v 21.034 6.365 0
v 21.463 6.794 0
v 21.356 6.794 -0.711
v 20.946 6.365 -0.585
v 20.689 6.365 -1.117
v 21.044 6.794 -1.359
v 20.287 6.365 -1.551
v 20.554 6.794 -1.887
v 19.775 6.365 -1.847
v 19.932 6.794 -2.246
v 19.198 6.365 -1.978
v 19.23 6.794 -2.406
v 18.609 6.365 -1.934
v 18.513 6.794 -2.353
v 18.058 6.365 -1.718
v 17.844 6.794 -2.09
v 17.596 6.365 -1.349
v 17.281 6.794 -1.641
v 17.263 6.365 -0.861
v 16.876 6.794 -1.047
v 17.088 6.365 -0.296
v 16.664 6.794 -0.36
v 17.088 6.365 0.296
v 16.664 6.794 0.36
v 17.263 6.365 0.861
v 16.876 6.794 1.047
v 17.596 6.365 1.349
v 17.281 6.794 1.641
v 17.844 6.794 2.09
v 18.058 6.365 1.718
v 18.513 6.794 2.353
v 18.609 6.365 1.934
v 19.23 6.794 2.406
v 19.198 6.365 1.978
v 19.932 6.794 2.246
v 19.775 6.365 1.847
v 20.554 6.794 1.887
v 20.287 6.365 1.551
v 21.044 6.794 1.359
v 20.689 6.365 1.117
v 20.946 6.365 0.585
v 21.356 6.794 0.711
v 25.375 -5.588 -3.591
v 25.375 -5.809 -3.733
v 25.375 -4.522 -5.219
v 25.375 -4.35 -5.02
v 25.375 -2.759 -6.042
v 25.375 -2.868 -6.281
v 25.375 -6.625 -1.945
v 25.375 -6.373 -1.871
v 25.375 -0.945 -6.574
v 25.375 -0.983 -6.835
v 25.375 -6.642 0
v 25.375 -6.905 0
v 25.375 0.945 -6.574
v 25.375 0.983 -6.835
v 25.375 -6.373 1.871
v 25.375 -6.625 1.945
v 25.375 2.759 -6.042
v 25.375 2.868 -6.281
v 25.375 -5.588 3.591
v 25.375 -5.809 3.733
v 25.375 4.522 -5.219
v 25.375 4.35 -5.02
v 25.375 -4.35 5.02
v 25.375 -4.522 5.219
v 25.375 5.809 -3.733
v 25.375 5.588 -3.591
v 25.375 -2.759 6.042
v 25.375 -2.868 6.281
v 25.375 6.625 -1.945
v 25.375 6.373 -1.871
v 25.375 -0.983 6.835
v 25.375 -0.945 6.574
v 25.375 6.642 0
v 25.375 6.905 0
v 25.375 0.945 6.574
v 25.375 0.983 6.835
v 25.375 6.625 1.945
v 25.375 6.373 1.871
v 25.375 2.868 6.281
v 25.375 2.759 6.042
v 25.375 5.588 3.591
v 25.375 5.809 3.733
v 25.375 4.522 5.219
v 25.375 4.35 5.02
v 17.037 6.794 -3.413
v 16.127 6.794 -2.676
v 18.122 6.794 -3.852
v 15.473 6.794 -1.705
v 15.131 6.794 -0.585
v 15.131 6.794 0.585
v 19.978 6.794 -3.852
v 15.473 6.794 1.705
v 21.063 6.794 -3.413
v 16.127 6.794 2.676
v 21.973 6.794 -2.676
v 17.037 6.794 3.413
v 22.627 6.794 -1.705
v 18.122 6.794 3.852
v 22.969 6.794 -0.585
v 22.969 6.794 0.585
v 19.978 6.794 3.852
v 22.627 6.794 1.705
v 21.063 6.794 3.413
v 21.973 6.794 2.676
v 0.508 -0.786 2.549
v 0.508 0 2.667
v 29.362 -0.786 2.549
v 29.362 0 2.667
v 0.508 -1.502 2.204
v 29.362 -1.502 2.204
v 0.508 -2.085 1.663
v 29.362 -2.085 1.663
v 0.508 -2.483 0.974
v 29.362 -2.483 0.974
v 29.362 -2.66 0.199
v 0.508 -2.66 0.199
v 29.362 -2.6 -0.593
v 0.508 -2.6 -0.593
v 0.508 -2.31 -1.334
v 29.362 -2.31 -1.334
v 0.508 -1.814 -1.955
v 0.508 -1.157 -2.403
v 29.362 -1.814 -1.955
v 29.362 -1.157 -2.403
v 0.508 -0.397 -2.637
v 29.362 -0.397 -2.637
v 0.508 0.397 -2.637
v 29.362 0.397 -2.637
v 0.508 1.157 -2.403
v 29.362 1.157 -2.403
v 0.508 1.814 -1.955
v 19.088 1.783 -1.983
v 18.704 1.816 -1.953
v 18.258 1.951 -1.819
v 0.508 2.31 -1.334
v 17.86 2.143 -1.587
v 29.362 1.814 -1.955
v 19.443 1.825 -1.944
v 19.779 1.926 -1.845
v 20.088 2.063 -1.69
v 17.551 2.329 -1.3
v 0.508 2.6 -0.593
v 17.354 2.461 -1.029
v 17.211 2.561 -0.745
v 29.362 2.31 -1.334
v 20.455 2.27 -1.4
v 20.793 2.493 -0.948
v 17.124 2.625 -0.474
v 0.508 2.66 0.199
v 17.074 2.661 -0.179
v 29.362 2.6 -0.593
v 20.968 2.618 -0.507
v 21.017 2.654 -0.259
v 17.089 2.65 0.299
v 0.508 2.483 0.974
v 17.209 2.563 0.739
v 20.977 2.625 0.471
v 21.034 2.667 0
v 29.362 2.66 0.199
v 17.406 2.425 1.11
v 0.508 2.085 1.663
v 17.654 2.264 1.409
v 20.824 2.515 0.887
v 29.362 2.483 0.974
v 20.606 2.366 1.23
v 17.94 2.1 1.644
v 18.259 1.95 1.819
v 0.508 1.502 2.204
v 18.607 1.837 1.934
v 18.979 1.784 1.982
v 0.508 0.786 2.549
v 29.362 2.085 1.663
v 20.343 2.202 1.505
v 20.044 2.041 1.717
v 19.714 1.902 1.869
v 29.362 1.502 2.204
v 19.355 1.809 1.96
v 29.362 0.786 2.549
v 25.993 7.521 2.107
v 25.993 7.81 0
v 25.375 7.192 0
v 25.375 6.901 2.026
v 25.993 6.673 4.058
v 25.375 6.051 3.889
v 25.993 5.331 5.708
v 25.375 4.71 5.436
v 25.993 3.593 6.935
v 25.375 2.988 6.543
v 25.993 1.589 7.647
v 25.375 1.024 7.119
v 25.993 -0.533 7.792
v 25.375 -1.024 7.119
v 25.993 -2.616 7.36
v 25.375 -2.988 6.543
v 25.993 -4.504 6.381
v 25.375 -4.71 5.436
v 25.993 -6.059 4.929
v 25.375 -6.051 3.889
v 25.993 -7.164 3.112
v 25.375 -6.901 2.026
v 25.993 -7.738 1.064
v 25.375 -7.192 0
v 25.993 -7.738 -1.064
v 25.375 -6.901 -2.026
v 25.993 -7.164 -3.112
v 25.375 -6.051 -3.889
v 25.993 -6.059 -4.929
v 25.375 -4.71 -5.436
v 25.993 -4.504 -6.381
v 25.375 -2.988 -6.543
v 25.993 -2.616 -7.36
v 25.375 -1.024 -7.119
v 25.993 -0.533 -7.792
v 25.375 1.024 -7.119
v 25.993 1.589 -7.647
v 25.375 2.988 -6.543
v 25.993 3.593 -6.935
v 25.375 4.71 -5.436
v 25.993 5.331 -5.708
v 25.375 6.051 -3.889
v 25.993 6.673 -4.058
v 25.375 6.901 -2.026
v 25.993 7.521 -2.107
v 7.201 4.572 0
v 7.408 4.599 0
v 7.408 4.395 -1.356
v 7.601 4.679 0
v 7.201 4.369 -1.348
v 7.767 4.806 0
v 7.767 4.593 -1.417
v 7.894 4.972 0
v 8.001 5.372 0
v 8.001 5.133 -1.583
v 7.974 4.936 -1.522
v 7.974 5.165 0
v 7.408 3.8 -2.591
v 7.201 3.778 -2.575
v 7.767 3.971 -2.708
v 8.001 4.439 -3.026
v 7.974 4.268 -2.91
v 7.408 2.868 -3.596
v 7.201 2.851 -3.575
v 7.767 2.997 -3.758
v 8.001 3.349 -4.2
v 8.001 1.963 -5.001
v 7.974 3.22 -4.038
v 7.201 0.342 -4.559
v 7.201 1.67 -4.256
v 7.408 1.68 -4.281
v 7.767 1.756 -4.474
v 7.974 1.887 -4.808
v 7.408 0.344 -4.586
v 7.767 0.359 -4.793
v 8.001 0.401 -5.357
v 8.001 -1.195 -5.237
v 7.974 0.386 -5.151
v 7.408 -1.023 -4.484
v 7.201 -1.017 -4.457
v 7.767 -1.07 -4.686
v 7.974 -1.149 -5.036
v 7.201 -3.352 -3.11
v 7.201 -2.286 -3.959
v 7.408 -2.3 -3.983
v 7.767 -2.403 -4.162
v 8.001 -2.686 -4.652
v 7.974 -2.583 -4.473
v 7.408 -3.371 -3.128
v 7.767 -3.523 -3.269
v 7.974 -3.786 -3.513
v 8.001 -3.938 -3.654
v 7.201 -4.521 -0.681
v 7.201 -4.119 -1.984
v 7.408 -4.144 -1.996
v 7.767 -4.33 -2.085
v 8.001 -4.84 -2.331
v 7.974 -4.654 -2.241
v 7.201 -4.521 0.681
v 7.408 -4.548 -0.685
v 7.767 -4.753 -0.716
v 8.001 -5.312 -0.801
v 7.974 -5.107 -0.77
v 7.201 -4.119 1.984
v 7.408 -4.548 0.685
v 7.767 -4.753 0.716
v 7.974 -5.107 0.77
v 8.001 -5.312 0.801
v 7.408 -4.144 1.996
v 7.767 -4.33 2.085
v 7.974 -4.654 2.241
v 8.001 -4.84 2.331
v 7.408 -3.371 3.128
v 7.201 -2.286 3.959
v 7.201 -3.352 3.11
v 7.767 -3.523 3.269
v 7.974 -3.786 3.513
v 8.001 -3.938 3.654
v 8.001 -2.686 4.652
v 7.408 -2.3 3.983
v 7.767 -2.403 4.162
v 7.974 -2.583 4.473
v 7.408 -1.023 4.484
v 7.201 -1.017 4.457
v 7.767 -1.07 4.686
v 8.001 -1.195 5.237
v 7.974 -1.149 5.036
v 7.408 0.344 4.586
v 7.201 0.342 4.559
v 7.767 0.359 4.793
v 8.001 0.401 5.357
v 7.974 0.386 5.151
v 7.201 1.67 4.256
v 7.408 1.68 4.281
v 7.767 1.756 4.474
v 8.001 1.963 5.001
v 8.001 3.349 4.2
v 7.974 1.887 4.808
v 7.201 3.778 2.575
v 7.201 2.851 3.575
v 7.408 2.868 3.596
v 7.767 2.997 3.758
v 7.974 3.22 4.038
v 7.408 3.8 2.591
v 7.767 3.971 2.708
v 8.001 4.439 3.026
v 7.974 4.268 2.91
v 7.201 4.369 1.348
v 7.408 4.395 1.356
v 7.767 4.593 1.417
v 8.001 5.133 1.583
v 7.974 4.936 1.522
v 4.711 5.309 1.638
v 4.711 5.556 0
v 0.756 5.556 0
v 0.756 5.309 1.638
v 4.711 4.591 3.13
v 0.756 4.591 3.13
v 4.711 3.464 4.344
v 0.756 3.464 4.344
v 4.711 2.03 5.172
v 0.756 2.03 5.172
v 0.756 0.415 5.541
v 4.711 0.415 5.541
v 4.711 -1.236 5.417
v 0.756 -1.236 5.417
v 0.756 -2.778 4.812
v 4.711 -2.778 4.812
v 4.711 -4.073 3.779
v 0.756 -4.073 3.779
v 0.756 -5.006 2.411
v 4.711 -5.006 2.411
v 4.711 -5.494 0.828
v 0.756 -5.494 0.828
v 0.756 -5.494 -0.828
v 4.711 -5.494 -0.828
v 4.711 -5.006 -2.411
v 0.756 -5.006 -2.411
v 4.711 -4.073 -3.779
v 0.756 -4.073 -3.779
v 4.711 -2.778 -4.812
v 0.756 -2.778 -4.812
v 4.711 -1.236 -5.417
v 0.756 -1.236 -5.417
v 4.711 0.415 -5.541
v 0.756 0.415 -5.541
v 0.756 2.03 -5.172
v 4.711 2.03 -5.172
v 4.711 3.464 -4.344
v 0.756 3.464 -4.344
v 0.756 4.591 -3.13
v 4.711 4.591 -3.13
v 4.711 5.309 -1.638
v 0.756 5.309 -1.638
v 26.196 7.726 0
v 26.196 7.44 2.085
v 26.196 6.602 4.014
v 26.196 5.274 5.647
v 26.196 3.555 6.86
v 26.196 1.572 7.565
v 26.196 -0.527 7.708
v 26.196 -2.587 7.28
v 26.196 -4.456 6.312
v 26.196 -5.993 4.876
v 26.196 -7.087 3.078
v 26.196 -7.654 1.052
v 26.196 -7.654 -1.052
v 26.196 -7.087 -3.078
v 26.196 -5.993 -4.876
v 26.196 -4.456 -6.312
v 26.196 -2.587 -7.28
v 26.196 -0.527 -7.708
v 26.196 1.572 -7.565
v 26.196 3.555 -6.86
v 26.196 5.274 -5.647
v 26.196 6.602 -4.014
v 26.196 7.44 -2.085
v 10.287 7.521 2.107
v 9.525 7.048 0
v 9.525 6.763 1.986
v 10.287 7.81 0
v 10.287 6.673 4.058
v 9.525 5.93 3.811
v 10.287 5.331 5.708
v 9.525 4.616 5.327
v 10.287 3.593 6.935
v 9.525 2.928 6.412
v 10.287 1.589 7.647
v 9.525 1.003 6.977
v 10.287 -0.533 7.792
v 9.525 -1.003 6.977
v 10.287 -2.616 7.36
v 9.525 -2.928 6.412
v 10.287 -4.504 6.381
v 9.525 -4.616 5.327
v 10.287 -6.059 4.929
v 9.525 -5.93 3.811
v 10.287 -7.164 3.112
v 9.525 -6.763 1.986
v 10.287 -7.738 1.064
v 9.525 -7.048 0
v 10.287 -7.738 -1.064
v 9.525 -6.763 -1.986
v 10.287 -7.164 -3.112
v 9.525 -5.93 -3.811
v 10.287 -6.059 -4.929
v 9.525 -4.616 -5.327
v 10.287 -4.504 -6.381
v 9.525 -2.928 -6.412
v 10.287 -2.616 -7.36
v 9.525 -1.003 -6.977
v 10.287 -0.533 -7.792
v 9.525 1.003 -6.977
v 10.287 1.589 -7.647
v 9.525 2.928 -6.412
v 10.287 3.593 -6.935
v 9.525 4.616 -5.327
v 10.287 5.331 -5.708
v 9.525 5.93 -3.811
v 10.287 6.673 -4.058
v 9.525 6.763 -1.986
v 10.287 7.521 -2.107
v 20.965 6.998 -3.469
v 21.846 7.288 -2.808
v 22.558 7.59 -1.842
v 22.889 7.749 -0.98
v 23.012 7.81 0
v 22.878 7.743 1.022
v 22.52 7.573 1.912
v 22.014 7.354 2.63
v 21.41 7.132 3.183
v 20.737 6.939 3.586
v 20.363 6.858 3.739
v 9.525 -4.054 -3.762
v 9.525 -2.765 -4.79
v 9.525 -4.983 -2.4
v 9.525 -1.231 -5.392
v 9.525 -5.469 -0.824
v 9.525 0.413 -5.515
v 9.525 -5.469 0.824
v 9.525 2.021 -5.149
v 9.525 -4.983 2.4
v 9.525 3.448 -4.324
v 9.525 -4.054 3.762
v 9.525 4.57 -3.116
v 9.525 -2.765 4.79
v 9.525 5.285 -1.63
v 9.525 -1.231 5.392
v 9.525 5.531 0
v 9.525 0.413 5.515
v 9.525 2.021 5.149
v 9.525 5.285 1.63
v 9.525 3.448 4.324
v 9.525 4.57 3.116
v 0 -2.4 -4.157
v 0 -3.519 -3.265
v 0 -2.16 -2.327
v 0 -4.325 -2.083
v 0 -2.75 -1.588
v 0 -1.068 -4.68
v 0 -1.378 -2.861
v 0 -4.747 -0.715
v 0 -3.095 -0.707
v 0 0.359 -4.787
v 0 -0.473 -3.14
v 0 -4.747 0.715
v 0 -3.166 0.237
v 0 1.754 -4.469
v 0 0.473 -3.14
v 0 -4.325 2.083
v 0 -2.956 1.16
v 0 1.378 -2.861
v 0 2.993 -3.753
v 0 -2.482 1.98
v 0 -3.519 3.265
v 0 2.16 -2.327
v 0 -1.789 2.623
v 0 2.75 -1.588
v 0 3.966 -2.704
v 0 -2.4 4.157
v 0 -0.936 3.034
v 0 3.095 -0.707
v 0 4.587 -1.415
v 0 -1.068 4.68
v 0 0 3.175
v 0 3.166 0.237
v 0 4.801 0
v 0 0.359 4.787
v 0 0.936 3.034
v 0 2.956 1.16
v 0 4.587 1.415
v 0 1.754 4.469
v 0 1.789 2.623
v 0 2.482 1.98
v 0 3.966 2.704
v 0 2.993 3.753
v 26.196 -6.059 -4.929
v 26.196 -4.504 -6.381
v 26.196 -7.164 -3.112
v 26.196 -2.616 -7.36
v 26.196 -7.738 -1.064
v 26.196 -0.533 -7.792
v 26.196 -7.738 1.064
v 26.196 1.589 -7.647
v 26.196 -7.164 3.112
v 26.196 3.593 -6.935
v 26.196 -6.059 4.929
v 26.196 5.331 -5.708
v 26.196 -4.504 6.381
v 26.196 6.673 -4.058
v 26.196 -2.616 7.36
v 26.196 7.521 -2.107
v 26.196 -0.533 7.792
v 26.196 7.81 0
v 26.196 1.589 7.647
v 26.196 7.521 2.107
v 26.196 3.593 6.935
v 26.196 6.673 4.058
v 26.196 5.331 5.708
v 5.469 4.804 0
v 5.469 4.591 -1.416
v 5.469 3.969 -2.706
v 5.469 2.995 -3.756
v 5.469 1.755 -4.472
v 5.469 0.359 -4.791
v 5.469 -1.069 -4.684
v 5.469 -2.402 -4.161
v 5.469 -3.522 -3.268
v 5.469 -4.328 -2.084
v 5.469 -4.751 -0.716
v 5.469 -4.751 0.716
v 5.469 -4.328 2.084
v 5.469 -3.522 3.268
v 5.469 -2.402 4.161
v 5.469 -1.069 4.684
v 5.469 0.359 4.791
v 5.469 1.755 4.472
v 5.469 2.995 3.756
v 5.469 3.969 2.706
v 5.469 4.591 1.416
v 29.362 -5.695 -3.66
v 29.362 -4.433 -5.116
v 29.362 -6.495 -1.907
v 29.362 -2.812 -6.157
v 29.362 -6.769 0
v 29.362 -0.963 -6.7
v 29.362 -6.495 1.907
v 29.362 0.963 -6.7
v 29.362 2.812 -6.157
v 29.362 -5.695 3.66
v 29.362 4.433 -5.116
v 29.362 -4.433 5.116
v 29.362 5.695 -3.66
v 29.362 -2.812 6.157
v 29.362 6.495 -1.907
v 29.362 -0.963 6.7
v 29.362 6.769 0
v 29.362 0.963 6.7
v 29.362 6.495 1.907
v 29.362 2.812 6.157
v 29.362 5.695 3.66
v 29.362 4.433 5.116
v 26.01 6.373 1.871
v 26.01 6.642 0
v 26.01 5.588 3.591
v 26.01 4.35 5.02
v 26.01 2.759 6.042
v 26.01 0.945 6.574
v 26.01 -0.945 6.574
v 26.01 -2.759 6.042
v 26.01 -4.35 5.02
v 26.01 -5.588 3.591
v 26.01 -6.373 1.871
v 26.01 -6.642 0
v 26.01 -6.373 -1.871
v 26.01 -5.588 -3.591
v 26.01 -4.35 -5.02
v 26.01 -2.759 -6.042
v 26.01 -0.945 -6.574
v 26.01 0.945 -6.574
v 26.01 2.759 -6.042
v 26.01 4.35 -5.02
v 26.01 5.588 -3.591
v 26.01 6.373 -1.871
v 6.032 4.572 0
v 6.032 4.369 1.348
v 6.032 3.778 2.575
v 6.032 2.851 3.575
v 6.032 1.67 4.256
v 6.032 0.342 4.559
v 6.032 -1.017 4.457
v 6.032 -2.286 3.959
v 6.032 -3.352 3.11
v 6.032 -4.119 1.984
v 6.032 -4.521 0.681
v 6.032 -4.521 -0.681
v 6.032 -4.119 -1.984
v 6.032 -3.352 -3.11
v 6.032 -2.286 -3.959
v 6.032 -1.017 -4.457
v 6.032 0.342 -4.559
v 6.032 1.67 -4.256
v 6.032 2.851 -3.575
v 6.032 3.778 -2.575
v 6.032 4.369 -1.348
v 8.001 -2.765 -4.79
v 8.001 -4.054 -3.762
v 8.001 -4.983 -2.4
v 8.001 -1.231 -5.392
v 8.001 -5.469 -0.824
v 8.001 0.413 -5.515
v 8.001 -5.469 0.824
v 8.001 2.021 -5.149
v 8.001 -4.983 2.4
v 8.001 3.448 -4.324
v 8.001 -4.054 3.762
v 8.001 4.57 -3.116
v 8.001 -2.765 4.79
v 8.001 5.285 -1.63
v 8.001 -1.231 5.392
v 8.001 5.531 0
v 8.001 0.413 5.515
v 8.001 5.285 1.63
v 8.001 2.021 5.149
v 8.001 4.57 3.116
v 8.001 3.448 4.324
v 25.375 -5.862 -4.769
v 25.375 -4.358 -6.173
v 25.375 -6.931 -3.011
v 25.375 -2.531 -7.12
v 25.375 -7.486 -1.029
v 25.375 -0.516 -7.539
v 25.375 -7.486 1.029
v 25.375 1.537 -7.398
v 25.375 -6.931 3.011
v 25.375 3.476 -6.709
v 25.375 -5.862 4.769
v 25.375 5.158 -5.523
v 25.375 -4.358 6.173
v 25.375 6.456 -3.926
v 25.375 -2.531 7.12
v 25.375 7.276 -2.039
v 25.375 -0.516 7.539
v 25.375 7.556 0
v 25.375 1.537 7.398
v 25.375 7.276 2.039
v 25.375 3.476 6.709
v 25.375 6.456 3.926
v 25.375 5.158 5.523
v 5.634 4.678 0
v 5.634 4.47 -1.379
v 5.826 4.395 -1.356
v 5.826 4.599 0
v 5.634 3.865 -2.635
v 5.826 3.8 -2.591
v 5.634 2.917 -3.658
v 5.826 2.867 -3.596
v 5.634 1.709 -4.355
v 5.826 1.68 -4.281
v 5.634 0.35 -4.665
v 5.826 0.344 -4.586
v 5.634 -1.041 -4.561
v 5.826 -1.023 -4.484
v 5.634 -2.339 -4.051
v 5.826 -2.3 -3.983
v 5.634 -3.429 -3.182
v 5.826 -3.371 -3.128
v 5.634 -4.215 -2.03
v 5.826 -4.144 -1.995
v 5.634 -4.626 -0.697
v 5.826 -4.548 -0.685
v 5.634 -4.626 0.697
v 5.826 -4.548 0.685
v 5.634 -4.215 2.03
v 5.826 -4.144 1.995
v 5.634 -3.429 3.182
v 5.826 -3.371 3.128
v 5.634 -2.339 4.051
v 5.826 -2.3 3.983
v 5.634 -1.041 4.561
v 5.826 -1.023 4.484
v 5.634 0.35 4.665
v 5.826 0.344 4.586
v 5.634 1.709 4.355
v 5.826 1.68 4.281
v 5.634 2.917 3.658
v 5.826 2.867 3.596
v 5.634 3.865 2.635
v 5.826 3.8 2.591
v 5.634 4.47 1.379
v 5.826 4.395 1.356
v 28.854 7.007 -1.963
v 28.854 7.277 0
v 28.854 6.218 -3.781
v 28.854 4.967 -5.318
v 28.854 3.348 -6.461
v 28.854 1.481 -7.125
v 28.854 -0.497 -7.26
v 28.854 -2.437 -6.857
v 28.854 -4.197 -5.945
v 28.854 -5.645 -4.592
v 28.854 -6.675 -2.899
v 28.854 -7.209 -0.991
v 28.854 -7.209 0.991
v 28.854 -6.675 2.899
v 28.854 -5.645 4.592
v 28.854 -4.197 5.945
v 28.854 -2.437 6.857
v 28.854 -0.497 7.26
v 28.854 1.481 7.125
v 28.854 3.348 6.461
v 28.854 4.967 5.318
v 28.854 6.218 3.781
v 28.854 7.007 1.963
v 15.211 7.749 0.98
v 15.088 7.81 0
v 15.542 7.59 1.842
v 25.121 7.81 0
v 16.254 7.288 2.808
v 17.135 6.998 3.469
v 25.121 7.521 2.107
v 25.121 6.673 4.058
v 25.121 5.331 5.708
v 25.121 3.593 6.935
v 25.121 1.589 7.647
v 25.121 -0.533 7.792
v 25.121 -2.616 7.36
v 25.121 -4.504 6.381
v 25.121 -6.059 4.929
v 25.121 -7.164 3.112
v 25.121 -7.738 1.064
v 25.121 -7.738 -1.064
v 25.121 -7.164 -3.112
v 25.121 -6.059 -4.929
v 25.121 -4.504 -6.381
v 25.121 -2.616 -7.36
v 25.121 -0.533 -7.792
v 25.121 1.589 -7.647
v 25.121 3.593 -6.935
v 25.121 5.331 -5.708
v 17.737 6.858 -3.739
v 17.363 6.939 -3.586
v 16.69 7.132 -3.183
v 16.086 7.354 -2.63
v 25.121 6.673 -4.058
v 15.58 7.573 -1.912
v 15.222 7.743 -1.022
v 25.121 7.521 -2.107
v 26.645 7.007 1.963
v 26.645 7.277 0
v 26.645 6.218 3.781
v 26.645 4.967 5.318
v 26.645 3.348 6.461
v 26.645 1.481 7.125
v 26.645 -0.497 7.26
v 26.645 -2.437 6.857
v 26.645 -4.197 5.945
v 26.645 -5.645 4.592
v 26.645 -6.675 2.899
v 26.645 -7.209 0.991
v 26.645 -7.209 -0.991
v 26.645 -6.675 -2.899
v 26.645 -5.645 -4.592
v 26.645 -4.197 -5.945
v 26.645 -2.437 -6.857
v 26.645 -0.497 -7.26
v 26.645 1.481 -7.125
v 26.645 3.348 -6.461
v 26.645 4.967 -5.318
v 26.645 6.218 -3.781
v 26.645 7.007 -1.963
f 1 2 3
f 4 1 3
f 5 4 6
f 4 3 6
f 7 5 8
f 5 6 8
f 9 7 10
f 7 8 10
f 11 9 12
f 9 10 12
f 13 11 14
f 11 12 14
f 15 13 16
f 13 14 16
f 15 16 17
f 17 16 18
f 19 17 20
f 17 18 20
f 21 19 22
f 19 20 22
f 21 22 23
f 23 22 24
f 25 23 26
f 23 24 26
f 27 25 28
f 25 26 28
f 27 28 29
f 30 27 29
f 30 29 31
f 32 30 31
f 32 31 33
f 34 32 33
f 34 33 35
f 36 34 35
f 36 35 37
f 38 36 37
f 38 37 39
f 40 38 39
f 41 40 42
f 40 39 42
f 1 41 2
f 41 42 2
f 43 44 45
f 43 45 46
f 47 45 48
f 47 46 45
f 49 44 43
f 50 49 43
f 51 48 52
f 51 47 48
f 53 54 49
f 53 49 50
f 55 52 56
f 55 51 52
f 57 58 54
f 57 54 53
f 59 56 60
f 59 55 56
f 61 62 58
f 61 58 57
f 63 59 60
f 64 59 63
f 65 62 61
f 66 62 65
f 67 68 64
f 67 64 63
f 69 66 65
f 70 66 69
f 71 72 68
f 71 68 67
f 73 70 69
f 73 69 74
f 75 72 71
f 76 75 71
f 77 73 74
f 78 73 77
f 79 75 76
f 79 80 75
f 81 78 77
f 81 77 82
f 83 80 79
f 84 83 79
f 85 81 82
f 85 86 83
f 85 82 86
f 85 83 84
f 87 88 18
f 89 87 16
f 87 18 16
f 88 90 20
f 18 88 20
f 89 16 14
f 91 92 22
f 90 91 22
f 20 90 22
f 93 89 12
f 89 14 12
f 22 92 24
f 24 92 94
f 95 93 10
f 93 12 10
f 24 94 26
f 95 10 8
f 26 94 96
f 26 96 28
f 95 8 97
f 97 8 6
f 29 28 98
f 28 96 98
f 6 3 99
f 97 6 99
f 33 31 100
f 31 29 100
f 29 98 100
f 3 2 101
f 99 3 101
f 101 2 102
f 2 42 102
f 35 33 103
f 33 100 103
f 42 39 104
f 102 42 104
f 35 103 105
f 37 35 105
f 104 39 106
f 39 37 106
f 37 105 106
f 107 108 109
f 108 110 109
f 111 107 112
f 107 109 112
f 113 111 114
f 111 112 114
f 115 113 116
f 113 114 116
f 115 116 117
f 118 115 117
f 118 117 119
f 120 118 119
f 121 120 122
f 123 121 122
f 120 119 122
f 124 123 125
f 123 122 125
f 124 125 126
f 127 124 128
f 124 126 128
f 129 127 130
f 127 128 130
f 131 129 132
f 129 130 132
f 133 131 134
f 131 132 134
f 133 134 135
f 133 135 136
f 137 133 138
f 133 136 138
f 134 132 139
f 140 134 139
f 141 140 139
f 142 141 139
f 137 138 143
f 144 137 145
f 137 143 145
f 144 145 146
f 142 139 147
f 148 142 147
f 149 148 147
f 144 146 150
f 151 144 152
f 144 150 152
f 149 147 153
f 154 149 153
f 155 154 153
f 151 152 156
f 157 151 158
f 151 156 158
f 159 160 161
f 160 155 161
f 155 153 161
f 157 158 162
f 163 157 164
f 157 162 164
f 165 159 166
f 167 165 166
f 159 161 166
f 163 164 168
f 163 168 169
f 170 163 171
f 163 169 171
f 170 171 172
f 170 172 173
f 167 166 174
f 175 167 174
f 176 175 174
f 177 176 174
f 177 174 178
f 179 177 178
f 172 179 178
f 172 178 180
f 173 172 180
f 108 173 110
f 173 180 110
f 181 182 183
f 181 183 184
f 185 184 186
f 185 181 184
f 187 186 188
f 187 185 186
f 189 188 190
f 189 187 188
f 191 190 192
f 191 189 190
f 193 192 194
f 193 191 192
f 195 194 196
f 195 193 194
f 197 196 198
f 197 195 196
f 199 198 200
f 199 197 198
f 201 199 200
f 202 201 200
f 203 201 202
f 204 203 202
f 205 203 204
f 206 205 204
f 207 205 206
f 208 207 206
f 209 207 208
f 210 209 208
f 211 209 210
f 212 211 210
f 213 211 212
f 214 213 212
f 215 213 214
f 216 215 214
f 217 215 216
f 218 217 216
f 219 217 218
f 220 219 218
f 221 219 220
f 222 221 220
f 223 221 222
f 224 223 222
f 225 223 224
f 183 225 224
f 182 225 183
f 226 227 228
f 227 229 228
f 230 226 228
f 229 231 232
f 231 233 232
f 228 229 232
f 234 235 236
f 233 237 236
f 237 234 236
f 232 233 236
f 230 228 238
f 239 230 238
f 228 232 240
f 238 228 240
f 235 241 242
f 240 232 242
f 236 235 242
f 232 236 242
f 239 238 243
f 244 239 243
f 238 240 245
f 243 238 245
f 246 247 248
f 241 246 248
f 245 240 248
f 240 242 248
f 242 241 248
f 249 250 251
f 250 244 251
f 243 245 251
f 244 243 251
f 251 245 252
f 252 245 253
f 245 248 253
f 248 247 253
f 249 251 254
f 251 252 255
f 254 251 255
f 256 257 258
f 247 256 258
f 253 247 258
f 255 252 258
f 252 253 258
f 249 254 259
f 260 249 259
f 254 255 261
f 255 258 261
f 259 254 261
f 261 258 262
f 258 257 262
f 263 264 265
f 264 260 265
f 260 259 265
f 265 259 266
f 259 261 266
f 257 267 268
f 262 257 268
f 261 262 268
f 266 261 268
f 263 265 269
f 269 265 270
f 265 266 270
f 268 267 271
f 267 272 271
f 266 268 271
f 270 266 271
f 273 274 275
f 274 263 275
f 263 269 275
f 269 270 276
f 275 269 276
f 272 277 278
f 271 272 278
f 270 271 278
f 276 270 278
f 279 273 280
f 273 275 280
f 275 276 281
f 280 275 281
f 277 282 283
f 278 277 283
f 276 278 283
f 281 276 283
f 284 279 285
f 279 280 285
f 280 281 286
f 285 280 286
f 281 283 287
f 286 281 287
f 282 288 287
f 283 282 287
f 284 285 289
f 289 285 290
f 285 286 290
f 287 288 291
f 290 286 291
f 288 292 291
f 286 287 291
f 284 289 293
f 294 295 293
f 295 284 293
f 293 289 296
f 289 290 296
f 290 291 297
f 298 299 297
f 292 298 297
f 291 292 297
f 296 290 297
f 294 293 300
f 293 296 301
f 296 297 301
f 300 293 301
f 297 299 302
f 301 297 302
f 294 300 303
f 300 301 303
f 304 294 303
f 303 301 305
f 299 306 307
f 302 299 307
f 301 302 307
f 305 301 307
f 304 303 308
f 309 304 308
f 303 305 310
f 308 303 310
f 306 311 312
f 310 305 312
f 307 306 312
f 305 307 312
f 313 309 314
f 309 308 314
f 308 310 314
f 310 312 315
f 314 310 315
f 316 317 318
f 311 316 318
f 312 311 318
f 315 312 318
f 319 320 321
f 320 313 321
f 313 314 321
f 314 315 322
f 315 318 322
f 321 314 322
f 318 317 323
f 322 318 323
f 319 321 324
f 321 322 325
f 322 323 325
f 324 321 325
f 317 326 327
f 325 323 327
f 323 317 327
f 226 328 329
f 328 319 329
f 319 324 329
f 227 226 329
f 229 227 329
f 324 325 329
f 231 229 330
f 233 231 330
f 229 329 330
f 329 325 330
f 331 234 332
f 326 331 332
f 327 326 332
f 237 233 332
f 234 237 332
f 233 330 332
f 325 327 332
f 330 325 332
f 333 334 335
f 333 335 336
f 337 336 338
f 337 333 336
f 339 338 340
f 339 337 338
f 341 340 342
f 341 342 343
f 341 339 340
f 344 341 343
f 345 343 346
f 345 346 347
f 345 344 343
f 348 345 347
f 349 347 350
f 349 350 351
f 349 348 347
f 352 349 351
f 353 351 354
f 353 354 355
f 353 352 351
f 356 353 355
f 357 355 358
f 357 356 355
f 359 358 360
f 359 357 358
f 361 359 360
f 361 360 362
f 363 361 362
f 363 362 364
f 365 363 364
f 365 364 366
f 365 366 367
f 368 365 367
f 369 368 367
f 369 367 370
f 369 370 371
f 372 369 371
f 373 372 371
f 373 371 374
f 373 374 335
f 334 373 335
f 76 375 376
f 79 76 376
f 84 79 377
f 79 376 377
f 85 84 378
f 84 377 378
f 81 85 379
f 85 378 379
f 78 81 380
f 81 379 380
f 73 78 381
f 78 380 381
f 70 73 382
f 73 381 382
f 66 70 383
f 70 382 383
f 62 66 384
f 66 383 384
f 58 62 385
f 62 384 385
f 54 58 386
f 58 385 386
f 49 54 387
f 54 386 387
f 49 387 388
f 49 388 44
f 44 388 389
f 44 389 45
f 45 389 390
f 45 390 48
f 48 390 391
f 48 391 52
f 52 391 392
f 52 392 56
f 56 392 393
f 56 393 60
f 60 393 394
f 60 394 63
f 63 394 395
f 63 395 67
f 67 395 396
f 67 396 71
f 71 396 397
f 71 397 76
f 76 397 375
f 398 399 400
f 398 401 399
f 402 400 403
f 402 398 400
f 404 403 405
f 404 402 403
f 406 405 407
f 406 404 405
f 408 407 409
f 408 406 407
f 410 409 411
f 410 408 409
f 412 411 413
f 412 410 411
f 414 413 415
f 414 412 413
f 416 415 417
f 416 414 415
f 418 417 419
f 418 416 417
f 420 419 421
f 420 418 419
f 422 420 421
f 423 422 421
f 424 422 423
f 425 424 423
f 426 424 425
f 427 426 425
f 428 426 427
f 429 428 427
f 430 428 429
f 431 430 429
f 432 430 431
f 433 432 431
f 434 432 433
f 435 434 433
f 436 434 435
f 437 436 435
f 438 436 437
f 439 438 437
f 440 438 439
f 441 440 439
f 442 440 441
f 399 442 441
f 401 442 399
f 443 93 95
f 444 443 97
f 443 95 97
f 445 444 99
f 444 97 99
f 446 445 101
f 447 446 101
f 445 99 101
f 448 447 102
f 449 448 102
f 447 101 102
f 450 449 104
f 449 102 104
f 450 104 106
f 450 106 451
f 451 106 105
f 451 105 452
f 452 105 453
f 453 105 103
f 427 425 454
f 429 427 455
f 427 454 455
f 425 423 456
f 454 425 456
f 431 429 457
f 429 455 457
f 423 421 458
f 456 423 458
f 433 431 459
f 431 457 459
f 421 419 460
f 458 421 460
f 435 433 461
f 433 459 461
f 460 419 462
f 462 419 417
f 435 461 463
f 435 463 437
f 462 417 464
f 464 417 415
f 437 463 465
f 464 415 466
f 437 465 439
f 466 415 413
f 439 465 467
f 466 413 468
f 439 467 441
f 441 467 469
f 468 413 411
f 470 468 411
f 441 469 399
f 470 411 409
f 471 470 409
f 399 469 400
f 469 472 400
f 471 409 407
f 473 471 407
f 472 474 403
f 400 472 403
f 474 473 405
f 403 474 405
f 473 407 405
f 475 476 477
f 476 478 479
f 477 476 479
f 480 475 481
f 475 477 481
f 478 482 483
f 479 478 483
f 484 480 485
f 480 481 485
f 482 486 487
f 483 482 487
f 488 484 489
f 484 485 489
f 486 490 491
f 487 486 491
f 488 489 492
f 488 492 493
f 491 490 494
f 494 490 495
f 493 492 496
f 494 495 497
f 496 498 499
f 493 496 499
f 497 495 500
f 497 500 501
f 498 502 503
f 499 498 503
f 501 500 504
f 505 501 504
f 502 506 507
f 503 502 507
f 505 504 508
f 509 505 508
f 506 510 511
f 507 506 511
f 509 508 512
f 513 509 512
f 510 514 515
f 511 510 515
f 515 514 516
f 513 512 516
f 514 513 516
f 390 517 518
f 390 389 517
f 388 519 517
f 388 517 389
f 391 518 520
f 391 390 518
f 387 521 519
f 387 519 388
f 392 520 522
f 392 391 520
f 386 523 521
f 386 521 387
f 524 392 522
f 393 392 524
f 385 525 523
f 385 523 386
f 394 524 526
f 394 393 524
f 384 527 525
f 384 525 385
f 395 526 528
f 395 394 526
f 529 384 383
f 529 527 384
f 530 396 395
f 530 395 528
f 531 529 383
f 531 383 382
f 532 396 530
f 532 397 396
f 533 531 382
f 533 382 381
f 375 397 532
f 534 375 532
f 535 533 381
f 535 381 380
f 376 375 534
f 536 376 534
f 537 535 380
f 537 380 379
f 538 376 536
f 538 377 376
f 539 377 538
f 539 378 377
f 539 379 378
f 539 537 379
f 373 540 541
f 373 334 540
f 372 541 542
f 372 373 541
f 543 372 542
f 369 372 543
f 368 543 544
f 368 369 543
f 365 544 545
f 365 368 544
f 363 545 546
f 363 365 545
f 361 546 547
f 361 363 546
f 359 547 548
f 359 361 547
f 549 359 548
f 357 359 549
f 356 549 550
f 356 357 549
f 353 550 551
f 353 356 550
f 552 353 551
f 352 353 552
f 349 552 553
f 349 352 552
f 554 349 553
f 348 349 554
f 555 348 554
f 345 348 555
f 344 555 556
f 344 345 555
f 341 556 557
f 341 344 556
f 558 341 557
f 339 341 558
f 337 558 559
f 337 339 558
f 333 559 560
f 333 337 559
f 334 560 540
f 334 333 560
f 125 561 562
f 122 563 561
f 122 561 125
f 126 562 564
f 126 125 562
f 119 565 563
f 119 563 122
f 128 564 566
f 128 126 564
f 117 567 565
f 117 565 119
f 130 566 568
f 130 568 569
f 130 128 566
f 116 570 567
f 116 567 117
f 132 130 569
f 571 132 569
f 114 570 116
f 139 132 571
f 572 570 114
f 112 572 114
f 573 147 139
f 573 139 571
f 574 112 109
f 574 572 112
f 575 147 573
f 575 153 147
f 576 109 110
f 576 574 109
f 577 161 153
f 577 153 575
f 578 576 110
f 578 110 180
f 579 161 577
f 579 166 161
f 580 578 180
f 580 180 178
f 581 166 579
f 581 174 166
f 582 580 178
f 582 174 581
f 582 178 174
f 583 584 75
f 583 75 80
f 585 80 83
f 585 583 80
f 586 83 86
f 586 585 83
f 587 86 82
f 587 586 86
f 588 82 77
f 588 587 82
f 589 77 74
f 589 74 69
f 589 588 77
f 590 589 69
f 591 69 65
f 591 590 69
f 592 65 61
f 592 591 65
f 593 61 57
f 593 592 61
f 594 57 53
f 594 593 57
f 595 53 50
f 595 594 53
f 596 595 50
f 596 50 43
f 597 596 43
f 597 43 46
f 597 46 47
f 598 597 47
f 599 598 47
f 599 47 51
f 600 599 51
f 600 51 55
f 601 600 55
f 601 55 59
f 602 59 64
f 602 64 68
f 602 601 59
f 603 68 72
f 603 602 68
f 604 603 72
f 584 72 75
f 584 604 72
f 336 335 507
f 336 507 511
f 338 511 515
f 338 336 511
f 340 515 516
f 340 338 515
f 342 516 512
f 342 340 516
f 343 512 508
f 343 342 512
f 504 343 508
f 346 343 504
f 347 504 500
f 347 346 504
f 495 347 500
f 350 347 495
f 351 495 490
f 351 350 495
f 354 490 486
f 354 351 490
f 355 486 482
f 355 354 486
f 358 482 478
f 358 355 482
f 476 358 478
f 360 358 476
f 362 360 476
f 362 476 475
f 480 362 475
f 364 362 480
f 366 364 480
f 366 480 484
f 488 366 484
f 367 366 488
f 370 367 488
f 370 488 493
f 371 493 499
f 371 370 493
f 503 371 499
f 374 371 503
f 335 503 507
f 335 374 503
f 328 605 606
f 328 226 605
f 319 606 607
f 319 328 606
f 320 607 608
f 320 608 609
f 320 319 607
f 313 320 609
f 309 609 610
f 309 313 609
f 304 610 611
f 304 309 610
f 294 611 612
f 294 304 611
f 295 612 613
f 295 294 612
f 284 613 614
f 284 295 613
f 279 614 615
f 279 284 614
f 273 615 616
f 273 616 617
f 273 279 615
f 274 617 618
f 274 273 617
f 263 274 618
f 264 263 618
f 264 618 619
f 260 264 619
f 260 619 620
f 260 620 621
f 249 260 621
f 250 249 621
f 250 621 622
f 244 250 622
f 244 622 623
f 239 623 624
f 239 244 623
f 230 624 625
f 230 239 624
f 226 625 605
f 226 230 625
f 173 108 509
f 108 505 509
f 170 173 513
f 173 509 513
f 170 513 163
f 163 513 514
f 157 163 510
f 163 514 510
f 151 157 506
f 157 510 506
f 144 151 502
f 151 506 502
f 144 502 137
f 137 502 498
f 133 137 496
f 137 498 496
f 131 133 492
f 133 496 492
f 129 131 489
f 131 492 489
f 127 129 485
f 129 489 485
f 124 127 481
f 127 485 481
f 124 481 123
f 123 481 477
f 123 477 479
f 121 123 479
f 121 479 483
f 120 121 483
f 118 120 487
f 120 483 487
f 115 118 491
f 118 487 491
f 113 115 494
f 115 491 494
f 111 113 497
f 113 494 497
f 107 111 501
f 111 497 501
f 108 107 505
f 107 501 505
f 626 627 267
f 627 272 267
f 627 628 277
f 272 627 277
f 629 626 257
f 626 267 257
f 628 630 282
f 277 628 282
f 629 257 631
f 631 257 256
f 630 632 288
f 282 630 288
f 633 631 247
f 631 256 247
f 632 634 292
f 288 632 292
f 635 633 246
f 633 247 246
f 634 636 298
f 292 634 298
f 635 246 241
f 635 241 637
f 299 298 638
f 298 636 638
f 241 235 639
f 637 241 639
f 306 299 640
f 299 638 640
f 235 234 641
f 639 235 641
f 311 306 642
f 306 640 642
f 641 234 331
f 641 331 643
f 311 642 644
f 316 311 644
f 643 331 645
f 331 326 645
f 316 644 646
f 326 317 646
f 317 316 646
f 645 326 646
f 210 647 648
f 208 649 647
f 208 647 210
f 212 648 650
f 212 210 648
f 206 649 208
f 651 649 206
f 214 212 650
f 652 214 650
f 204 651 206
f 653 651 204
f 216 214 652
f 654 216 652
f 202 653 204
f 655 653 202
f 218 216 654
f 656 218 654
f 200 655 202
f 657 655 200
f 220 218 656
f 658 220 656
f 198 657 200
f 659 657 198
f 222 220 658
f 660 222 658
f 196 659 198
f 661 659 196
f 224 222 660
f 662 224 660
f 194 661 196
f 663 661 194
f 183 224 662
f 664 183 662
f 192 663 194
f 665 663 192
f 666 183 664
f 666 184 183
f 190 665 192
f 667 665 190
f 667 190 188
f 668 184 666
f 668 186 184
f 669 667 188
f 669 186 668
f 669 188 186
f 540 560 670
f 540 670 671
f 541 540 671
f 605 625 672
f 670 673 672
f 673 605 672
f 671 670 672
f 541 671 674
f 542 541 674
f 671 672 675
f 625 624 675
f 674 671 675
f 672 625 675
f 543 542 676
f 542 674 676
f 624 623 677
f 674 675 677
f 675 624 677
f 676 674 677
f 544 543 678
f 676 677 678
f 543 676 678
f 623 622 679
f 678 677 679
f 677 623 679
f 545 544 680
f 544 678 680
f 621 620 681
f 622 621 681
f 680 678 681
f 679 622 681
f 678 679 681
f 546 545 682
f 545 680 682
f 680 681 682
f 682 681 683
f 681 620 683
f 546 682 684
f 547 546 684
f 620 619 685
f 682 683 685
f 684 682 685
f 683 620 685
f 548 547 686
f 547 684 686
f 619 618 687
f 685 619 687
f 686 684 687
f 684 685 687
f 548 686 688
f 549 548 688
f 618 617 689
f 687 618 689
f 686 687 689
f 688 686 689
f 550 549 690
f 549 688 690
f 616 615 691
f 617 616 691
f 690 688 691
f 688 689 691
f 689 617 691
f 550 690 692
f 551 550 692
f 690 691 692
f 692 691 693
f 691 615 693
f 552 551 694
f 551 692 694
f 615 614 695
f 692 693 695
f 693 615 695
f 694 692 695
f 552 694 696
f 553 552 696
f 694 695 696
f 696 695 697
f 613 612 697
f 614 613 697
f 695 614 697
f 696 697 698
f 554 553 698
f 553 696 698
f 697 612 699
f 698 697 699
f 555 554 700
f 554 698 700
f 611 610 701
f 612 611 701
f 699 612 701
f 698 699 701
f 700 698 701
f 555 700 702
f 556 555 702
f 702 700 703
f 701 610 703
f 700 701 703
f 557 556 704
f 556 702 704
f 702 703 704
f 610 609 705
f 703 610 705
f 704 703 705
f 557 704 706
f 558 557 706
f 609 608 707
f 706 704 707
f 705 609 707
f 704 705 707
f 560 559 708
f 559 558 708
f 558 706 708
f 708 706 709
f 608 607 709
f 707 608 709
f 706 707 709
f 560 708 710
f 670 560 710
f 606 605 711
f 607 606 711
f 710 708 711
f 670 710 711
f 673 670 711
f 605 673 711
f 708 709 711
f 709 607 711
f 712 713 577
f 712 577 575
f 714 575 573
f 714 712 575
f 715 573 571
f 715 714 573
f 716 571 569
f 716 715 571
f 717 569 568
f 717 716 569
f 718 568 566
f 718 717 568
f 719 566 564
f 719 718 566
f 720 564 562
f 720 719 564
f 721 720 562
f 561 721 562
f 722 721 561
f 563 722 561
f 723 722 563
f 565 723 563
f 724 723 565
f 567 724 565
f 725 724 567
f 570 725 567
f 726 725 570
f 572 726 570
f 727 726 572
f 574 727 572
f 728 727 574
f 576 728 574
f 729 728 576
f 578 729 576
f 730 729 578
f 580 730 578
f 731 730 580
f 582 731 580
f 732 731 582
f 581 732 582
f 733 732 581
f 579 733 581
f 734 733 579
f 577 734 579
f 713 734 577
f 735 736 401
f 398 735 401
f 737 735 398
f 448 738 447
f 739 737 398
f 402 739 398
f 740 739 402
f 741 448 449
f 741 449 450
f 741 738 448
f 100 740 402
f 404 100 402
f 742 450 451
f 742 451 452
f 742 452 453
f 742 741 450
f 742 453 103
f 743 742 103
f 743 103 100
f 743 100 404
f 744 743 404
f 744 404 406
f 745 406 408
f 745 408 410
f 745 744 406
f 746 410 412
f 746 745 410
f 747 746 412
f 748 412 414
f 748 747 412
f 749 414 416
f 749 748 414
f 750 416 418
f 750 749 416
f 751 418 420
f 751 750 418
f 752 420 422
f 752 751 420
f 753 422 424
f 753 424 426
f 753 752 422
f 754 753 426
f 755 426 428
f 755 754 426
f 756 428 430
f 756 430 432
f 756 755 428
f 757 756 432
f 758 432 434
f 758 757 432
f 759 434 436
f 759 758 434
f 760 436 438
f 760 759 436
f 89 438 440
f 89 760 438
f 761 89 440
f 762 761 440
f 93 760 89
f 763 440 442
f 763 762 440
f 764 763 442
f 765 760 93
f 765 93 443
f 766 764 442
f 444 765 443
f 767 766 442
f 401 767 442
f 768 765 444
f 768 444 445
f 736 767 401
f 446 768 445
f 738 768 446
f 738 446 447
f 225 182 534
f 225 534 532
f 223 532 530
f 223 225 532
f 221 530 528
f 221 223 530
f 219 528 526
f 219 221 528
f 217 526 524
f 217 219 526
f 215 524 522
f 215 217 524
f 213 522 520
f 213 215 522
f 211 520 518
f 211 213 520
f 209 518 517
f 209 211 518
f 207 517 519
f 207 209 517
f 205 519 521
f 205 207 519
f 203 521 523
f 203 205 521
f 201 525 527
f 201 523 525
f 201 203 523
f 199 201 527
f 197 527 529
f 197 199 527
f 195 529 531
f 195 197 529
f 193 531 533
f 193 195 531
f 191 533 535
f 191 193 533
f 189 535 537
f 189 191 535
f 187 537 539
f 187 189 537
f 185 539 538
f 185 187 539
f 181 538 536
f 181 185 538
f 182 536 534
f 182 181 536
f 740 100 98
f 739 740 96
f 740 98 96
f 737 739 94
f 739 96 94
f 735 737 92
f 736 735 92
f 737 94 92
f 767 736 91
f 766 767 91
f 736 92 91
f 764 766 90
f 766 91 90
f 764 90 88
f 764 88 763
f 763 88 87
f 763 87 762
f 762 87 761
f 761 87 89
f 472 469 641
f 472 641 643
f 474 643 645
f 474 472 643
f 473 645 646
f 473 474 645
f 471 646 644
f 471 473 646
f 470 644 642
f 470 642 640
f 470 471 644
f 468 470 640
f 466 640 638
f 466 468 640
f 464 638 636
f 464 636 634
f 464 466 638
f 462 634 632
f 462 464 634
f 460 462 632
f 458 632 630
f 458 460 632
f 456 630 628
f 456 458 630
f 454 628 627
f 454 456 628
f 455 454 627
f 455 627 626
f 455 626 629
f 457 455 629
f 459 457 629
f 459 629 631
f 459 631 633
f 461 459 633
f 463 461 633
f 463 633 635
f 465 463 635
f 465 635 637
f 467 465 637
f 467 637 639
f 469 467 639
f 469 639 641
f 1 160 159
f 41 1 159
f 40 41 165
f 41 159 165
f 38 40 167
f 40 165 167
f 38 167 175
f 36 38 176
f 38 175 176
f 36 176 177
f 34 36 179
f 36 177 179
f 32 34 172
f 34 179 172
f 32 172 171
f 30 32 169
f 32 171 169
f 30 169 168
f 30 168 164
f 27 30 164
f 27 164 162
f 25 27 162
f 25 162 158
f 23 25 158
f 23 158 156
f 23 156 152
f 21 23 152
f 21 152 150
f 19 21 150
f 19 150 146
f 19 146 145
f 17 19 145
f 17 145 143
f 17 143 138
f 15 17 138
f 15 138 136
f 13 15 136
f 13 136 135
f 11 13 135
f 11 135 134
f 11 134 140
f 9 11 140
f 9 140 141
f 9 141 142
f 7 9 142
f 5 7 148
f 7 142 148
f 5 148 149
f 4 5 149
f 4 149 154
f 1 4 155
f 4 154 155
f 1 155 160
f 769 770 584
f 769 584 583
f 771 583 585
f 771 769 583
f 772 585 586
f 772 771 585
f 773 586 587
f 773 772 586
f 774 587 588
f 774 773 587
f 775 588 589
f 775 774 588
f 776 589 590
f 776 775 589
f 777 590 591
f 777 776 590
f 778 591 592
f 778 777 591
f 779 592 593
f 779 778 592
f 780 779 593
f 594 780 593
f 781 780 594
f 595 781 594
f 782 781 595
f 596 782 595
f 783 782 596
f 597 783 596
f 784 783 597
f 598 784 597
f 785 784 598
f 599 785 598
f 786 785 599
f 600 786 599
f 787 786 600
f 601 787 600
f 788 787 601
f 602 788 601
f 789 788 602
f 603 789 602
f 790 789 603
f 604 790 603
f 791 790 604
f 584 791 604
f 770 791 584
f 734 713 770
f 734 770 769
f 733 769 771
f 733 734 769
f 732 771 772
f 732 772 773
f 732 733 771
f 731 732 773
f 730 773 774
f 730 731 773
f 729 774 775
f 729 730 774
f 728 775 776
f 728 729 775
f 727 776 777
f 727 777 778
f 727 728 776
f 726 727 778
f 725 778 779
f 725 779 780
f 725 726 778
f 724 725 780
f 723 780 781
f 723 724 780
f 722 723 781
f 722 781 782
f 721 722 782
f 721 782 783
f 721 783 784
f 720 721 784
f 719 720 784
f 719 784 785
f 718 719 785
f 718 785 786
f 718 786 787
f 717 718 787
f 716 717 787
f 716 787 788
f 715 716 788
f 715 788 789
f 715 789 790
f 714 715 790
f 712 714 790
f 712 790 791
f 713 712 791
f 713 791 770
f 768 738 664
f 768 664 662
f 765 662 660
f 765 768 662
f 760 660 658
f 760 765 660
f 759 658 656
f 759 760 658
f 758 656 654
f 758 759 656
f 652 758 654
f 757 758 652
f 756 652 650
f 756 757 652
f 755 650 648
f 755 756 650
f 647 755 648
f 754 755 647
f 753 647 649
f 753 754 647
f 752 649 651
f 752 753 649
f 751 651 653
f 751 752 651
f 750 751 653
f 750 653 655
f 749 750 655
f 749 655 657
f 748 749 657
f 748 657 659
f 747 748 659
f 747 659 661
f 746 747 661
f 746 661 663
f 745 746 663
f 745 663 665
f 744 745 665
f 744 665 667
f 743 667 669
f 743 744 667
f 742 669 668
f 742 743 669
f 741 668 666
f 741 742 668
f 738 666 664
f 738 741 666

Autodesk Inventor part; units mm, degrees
sketch "Sketch_2" plane through (0, 0, 0) normal (0, 0, 1) x (1, 0, 0)
  line L0 (9.525, 0) -> (0, 0)
  line L1 (0, 0) -> (0, 4.8006)
  line L2 (0, 4.8006) -> (0.7556, 5.5563)
  line L3 (0.7556, 5.5563) -> (4.7111, 5.5563)
  line L4 (4.7111, 5.5563) -> (5.4689, 4.8042)
  arc A0 (5.4689, 4.8042) -> (6.0325, 4.572) centre (6.0325, 5.3721) ccw
  line L5 (6.0325, 4.572) -> (7.2009, 4.572)
  arc A1 (7.2009, 4.572) -> (8.001, 5.3721) centre (7.2009, 5.3721) ccw
  line L6 (8.001, 5.3721) -> (8.001, 5.5309)
  line L7 (8.001, 5.5309) -> (9.525, 5.5309)
  line L8 (9.525, 5.5309) -> (9.525, 0)
  line L9 (9.525, 0) -> (0, 0)
revolve "Revolution1" add sketch "Sketch_2" angle 360 about axis through (9.525, 0, 0) along (1, 0, 0)
thread "Thread1" size "7/16-20 UNF" class "2A" standard "ANSI Unified Screw Threads" full length
sketch "Sketch_3" plane through (0, 0, 0) normal (0, 0, 1) x (1, 0, 0)
  line L0 (29.3624, 0) -> (9.525, 0)
  line L1 (9.525, 0) -> (9.525, 7.0485)
  line L2 (9.525, 7.0485) -> (10.287, 7.8105)
  line L3 (10.287, 7.8105) -> (25.1206, 7.8105)
  line L4 (25.1206, 7.8105) -> (25.3746, 7.5565)
  line L5 (25.3746, 7.5565) -> (25.3746, 6.6421)
  line L6 (25.3746, 6.6421) -> (26.0096, 6.6421)
  line L7 (26.0096, 6.6421) -> (26.6446, 7.2771)
  line L8 (26.6446, 7.2771) -> (28.8544, 7.2771)
  line L9 (28.8544, 7.2771) -> (29.3624, 6.7691)
  line L10 (29.3624, 6.7691) -> (29.3624, 0)
  line L11 (29.3624, 0) -> (9.525, 0)
revolve "Revolution2" add sketch "Sketch_3" angle 360 about axis through (29.3624, 0, 0) along (1, 0, 0)
sketch "Sketch3" plane through (0, 0, 0) normal (-1, 0, 0) x (0, 0, 1)
  point P0 (0, 0)
hole "Hole1" at (0, 0, 0) direction (1, 0, 0) diameter 5.334 depth 29.3624 countersink diameter 6.35 countersink angle 90
sketch "Sketch_13" plane through (0, 0, 0) normal (0, 0, 1) x (1, 0, 0)
  line L0 (19.05, -1.016) -> (19.05, 7.8105)
  line L1 (19.05, 7.8105) -> (23.0124, 7.8105)
  line L2 (23.0124, 7.8105) -> (23.0124, 6.7945)
  line L3 (23.0124, 6.7945) -> (21.463, 6.7945)
  line L4 (21.463, 6.7945) -> (21.0337, 6.3652)
  line L5 (21.0337, 6.3652) -> (21.0337, -1.016)
  line L6 (21.0337, -1.016) -> (19.05, -1.016)
  line L7 (19.05, -1.016) -> (19.05, 7.8105)
revolve "Revolution3" cut sketch "Sketch_13" angle 360 about axis through (19.05, -1.016, 0) along (0, -1, 0)
thread "Thread2" size "10-32 UNF" class "2B" standard "ANSI Unified Screw Threads" length 2.4257 offset 2.5862
sketch "Sketch_47" plane through (0, 0, 0) normal (0, 0, 1) x (1, 0, 0)
  line L0 (29.3624, 0) -> (-29.3624, 0)
  line L1 (24.8242, 6.6421) -> (25.1116, 6.6421)
  line L2 (25.1116, 6.6421) -> (26.1958, 7.7263)
  line L3 (26.1958, 7.7263) -> (26.1958, 7.8105)
  line L4 (26.1958, 7.8105) -> (25.9926, 7.8105)
  line L5 (25.9926, 7.8105) -> (24.8242, 6.6421)
revolve "Revolution4" add sketch "Sketch_47" angle 360 about axis through (29.3624, 0, 0) along (1, 0, 0)
ref_plane "c2_XY" through (19.05, 0, 0) normal (0, 0, 1) x (1, 0, 0)
ref_plane "c2_YZ" through (19.05, 0, 0) normal (1, 0, 0) x (0, 1, 0)
ref_plane "c2_ZX" through (19.05, 0, 0) normal (0, 1, 0) x (0, 0, 1)
ref_plane "e2_XY" through (9.525, 0, 0) normal (0, 0, 1) x (1, 0, 0)
ref_plane "e2_YZ" through (9.525, 0, 0) normal (1, 0, 0) x (0, 1, 0)
ref_plane "e2_ZX" through (9.525, 0, 0) normal (0, 1, 0) x (0, 0, 1)
ref_plane "f1_XY" through (8.001, 0, 0) normal (0, 0, 1) x (1, 0, 0)
ref_plane "f1_YZ" through (8.001, 0, 0) normal (1, 0, 0) x (0, 1, 0)
ref_plane "f1_ZX" through (8.001, 0, 0) normal (0, 1, 0) x (0, 0, 1)
ref_plane "f2_XY" through (9.525, 0, 0) normal (0, 0, 1) x (1, 0, 0)
ref_plane "f2_YZ" through (9.525, 0, 0) normal (1, 0, 0) x (0, 1, 0)
ref_plane "f2_ZX" through (9.525, 0, 0) normal (0, 1, 0) x (0, 0, 1)
ref_plane "i1_XY" through (0, 0, -5.5563) normal (0, 1, 0) x (1, 0, 0)
ref_plane "i1_YZ" through (0, 0, -5.5563) normal (1, 0, 0) x (0, 0, -1)
ref_plane "i1_ZX" through (0, 0, -5.5563) normal (0, 0, -1) x (0, 1, 0)
ref_plane "i2_XY" through (0, 0, 5.5563) normal (0, 1, 0) x (1, 0, 0)
ref_plane "i2_YZ" through (0, 0, 5.5563) normal (1, 0, 0) x (0, 0, -1)
ref_plane "i2_ZX" through (0, 0, 5.5563) normal (0, 0, -1) x (0, 1, 0)
ref_plane "l1_XY" through (9.525, 0, -5.5309) normal (0, 1, 0) x (1, 0, 0)
ref_plane "l1_YZ" through (9.525, 0, -5.5309) normal (1, 0, 0) x (0, 0, -1)
ref_plane "l1_ZX" through (9.525, 0, -5.5309) normal (0, 0, -1) x (0, 1, 0)
ref_plane "l2_XY" through (9.525, 0, 5.5309) normal (0, 1, 0) x (1, 0, 0)
ref_plane "l2_YZ" through (9.525, 0, 5.5309) normal (1, 0, 0) x (0, 0, -1)
ref_plane "l2_ZX" through (9.525, 0, 5.5309) normal (0, 0, -1) x (0, 1, 0)
ref_plane "rod_guide_XY" through (0, 0, 0) normal (1, 0, 0) x (0, 0, -1)
ref_plane "rod_guide_YZ" through (0, 0, 0) normal (0, 0, -1) x (0, 1, 0)
ref_plane "rod_guide_ZX" through (0, 0, 0) normal (0, 1, 0) x (1, 0, 0)
ref_plane "to_mounting_bracket_XY" through (9.525, 0, 0) normal (1, 0, 0) x (0, 0, -1)
ref_plane "to_mounting_bracket_YZ" through (9.525, 0, 0) normal (0, 0, -1) x (0, 1, 0)
ref_plane "to_mounting_bracket_ZX" through (9.525, 0, 0) normal (0, 1, 0) x (1, 0, 0)
ref_plane "to_rod_XY" through (-12.7, 0, 0) normal (1, 0, 0) x (0, 0, -1)
ref_plane "to_rod_YZ" through (-12.7, 0, 0) normal (0, 0, -1) x (0, 1, 0)
ref_plane "to_rod_ZX" through (-12.7, 0, 0) normal (0, 1, 0) x (1, 0, 0)
ref_plane "to_tube_XY" through (26.6446, 0, 0) normal (1, 0, 0) x (0, 0, -1)
ref_plane "to_tube_YZ" through (26.6446, 0, 0) normal (0, 0, -1) x (0, 1, 0)
ref_plane "to_tube_ZX" through (26.6446, 0, 0) normal (0, 1, 0) x (1, 0, 0)
properties part number "D-26368----0.5_rod_guide_cyl" material "Steel"
